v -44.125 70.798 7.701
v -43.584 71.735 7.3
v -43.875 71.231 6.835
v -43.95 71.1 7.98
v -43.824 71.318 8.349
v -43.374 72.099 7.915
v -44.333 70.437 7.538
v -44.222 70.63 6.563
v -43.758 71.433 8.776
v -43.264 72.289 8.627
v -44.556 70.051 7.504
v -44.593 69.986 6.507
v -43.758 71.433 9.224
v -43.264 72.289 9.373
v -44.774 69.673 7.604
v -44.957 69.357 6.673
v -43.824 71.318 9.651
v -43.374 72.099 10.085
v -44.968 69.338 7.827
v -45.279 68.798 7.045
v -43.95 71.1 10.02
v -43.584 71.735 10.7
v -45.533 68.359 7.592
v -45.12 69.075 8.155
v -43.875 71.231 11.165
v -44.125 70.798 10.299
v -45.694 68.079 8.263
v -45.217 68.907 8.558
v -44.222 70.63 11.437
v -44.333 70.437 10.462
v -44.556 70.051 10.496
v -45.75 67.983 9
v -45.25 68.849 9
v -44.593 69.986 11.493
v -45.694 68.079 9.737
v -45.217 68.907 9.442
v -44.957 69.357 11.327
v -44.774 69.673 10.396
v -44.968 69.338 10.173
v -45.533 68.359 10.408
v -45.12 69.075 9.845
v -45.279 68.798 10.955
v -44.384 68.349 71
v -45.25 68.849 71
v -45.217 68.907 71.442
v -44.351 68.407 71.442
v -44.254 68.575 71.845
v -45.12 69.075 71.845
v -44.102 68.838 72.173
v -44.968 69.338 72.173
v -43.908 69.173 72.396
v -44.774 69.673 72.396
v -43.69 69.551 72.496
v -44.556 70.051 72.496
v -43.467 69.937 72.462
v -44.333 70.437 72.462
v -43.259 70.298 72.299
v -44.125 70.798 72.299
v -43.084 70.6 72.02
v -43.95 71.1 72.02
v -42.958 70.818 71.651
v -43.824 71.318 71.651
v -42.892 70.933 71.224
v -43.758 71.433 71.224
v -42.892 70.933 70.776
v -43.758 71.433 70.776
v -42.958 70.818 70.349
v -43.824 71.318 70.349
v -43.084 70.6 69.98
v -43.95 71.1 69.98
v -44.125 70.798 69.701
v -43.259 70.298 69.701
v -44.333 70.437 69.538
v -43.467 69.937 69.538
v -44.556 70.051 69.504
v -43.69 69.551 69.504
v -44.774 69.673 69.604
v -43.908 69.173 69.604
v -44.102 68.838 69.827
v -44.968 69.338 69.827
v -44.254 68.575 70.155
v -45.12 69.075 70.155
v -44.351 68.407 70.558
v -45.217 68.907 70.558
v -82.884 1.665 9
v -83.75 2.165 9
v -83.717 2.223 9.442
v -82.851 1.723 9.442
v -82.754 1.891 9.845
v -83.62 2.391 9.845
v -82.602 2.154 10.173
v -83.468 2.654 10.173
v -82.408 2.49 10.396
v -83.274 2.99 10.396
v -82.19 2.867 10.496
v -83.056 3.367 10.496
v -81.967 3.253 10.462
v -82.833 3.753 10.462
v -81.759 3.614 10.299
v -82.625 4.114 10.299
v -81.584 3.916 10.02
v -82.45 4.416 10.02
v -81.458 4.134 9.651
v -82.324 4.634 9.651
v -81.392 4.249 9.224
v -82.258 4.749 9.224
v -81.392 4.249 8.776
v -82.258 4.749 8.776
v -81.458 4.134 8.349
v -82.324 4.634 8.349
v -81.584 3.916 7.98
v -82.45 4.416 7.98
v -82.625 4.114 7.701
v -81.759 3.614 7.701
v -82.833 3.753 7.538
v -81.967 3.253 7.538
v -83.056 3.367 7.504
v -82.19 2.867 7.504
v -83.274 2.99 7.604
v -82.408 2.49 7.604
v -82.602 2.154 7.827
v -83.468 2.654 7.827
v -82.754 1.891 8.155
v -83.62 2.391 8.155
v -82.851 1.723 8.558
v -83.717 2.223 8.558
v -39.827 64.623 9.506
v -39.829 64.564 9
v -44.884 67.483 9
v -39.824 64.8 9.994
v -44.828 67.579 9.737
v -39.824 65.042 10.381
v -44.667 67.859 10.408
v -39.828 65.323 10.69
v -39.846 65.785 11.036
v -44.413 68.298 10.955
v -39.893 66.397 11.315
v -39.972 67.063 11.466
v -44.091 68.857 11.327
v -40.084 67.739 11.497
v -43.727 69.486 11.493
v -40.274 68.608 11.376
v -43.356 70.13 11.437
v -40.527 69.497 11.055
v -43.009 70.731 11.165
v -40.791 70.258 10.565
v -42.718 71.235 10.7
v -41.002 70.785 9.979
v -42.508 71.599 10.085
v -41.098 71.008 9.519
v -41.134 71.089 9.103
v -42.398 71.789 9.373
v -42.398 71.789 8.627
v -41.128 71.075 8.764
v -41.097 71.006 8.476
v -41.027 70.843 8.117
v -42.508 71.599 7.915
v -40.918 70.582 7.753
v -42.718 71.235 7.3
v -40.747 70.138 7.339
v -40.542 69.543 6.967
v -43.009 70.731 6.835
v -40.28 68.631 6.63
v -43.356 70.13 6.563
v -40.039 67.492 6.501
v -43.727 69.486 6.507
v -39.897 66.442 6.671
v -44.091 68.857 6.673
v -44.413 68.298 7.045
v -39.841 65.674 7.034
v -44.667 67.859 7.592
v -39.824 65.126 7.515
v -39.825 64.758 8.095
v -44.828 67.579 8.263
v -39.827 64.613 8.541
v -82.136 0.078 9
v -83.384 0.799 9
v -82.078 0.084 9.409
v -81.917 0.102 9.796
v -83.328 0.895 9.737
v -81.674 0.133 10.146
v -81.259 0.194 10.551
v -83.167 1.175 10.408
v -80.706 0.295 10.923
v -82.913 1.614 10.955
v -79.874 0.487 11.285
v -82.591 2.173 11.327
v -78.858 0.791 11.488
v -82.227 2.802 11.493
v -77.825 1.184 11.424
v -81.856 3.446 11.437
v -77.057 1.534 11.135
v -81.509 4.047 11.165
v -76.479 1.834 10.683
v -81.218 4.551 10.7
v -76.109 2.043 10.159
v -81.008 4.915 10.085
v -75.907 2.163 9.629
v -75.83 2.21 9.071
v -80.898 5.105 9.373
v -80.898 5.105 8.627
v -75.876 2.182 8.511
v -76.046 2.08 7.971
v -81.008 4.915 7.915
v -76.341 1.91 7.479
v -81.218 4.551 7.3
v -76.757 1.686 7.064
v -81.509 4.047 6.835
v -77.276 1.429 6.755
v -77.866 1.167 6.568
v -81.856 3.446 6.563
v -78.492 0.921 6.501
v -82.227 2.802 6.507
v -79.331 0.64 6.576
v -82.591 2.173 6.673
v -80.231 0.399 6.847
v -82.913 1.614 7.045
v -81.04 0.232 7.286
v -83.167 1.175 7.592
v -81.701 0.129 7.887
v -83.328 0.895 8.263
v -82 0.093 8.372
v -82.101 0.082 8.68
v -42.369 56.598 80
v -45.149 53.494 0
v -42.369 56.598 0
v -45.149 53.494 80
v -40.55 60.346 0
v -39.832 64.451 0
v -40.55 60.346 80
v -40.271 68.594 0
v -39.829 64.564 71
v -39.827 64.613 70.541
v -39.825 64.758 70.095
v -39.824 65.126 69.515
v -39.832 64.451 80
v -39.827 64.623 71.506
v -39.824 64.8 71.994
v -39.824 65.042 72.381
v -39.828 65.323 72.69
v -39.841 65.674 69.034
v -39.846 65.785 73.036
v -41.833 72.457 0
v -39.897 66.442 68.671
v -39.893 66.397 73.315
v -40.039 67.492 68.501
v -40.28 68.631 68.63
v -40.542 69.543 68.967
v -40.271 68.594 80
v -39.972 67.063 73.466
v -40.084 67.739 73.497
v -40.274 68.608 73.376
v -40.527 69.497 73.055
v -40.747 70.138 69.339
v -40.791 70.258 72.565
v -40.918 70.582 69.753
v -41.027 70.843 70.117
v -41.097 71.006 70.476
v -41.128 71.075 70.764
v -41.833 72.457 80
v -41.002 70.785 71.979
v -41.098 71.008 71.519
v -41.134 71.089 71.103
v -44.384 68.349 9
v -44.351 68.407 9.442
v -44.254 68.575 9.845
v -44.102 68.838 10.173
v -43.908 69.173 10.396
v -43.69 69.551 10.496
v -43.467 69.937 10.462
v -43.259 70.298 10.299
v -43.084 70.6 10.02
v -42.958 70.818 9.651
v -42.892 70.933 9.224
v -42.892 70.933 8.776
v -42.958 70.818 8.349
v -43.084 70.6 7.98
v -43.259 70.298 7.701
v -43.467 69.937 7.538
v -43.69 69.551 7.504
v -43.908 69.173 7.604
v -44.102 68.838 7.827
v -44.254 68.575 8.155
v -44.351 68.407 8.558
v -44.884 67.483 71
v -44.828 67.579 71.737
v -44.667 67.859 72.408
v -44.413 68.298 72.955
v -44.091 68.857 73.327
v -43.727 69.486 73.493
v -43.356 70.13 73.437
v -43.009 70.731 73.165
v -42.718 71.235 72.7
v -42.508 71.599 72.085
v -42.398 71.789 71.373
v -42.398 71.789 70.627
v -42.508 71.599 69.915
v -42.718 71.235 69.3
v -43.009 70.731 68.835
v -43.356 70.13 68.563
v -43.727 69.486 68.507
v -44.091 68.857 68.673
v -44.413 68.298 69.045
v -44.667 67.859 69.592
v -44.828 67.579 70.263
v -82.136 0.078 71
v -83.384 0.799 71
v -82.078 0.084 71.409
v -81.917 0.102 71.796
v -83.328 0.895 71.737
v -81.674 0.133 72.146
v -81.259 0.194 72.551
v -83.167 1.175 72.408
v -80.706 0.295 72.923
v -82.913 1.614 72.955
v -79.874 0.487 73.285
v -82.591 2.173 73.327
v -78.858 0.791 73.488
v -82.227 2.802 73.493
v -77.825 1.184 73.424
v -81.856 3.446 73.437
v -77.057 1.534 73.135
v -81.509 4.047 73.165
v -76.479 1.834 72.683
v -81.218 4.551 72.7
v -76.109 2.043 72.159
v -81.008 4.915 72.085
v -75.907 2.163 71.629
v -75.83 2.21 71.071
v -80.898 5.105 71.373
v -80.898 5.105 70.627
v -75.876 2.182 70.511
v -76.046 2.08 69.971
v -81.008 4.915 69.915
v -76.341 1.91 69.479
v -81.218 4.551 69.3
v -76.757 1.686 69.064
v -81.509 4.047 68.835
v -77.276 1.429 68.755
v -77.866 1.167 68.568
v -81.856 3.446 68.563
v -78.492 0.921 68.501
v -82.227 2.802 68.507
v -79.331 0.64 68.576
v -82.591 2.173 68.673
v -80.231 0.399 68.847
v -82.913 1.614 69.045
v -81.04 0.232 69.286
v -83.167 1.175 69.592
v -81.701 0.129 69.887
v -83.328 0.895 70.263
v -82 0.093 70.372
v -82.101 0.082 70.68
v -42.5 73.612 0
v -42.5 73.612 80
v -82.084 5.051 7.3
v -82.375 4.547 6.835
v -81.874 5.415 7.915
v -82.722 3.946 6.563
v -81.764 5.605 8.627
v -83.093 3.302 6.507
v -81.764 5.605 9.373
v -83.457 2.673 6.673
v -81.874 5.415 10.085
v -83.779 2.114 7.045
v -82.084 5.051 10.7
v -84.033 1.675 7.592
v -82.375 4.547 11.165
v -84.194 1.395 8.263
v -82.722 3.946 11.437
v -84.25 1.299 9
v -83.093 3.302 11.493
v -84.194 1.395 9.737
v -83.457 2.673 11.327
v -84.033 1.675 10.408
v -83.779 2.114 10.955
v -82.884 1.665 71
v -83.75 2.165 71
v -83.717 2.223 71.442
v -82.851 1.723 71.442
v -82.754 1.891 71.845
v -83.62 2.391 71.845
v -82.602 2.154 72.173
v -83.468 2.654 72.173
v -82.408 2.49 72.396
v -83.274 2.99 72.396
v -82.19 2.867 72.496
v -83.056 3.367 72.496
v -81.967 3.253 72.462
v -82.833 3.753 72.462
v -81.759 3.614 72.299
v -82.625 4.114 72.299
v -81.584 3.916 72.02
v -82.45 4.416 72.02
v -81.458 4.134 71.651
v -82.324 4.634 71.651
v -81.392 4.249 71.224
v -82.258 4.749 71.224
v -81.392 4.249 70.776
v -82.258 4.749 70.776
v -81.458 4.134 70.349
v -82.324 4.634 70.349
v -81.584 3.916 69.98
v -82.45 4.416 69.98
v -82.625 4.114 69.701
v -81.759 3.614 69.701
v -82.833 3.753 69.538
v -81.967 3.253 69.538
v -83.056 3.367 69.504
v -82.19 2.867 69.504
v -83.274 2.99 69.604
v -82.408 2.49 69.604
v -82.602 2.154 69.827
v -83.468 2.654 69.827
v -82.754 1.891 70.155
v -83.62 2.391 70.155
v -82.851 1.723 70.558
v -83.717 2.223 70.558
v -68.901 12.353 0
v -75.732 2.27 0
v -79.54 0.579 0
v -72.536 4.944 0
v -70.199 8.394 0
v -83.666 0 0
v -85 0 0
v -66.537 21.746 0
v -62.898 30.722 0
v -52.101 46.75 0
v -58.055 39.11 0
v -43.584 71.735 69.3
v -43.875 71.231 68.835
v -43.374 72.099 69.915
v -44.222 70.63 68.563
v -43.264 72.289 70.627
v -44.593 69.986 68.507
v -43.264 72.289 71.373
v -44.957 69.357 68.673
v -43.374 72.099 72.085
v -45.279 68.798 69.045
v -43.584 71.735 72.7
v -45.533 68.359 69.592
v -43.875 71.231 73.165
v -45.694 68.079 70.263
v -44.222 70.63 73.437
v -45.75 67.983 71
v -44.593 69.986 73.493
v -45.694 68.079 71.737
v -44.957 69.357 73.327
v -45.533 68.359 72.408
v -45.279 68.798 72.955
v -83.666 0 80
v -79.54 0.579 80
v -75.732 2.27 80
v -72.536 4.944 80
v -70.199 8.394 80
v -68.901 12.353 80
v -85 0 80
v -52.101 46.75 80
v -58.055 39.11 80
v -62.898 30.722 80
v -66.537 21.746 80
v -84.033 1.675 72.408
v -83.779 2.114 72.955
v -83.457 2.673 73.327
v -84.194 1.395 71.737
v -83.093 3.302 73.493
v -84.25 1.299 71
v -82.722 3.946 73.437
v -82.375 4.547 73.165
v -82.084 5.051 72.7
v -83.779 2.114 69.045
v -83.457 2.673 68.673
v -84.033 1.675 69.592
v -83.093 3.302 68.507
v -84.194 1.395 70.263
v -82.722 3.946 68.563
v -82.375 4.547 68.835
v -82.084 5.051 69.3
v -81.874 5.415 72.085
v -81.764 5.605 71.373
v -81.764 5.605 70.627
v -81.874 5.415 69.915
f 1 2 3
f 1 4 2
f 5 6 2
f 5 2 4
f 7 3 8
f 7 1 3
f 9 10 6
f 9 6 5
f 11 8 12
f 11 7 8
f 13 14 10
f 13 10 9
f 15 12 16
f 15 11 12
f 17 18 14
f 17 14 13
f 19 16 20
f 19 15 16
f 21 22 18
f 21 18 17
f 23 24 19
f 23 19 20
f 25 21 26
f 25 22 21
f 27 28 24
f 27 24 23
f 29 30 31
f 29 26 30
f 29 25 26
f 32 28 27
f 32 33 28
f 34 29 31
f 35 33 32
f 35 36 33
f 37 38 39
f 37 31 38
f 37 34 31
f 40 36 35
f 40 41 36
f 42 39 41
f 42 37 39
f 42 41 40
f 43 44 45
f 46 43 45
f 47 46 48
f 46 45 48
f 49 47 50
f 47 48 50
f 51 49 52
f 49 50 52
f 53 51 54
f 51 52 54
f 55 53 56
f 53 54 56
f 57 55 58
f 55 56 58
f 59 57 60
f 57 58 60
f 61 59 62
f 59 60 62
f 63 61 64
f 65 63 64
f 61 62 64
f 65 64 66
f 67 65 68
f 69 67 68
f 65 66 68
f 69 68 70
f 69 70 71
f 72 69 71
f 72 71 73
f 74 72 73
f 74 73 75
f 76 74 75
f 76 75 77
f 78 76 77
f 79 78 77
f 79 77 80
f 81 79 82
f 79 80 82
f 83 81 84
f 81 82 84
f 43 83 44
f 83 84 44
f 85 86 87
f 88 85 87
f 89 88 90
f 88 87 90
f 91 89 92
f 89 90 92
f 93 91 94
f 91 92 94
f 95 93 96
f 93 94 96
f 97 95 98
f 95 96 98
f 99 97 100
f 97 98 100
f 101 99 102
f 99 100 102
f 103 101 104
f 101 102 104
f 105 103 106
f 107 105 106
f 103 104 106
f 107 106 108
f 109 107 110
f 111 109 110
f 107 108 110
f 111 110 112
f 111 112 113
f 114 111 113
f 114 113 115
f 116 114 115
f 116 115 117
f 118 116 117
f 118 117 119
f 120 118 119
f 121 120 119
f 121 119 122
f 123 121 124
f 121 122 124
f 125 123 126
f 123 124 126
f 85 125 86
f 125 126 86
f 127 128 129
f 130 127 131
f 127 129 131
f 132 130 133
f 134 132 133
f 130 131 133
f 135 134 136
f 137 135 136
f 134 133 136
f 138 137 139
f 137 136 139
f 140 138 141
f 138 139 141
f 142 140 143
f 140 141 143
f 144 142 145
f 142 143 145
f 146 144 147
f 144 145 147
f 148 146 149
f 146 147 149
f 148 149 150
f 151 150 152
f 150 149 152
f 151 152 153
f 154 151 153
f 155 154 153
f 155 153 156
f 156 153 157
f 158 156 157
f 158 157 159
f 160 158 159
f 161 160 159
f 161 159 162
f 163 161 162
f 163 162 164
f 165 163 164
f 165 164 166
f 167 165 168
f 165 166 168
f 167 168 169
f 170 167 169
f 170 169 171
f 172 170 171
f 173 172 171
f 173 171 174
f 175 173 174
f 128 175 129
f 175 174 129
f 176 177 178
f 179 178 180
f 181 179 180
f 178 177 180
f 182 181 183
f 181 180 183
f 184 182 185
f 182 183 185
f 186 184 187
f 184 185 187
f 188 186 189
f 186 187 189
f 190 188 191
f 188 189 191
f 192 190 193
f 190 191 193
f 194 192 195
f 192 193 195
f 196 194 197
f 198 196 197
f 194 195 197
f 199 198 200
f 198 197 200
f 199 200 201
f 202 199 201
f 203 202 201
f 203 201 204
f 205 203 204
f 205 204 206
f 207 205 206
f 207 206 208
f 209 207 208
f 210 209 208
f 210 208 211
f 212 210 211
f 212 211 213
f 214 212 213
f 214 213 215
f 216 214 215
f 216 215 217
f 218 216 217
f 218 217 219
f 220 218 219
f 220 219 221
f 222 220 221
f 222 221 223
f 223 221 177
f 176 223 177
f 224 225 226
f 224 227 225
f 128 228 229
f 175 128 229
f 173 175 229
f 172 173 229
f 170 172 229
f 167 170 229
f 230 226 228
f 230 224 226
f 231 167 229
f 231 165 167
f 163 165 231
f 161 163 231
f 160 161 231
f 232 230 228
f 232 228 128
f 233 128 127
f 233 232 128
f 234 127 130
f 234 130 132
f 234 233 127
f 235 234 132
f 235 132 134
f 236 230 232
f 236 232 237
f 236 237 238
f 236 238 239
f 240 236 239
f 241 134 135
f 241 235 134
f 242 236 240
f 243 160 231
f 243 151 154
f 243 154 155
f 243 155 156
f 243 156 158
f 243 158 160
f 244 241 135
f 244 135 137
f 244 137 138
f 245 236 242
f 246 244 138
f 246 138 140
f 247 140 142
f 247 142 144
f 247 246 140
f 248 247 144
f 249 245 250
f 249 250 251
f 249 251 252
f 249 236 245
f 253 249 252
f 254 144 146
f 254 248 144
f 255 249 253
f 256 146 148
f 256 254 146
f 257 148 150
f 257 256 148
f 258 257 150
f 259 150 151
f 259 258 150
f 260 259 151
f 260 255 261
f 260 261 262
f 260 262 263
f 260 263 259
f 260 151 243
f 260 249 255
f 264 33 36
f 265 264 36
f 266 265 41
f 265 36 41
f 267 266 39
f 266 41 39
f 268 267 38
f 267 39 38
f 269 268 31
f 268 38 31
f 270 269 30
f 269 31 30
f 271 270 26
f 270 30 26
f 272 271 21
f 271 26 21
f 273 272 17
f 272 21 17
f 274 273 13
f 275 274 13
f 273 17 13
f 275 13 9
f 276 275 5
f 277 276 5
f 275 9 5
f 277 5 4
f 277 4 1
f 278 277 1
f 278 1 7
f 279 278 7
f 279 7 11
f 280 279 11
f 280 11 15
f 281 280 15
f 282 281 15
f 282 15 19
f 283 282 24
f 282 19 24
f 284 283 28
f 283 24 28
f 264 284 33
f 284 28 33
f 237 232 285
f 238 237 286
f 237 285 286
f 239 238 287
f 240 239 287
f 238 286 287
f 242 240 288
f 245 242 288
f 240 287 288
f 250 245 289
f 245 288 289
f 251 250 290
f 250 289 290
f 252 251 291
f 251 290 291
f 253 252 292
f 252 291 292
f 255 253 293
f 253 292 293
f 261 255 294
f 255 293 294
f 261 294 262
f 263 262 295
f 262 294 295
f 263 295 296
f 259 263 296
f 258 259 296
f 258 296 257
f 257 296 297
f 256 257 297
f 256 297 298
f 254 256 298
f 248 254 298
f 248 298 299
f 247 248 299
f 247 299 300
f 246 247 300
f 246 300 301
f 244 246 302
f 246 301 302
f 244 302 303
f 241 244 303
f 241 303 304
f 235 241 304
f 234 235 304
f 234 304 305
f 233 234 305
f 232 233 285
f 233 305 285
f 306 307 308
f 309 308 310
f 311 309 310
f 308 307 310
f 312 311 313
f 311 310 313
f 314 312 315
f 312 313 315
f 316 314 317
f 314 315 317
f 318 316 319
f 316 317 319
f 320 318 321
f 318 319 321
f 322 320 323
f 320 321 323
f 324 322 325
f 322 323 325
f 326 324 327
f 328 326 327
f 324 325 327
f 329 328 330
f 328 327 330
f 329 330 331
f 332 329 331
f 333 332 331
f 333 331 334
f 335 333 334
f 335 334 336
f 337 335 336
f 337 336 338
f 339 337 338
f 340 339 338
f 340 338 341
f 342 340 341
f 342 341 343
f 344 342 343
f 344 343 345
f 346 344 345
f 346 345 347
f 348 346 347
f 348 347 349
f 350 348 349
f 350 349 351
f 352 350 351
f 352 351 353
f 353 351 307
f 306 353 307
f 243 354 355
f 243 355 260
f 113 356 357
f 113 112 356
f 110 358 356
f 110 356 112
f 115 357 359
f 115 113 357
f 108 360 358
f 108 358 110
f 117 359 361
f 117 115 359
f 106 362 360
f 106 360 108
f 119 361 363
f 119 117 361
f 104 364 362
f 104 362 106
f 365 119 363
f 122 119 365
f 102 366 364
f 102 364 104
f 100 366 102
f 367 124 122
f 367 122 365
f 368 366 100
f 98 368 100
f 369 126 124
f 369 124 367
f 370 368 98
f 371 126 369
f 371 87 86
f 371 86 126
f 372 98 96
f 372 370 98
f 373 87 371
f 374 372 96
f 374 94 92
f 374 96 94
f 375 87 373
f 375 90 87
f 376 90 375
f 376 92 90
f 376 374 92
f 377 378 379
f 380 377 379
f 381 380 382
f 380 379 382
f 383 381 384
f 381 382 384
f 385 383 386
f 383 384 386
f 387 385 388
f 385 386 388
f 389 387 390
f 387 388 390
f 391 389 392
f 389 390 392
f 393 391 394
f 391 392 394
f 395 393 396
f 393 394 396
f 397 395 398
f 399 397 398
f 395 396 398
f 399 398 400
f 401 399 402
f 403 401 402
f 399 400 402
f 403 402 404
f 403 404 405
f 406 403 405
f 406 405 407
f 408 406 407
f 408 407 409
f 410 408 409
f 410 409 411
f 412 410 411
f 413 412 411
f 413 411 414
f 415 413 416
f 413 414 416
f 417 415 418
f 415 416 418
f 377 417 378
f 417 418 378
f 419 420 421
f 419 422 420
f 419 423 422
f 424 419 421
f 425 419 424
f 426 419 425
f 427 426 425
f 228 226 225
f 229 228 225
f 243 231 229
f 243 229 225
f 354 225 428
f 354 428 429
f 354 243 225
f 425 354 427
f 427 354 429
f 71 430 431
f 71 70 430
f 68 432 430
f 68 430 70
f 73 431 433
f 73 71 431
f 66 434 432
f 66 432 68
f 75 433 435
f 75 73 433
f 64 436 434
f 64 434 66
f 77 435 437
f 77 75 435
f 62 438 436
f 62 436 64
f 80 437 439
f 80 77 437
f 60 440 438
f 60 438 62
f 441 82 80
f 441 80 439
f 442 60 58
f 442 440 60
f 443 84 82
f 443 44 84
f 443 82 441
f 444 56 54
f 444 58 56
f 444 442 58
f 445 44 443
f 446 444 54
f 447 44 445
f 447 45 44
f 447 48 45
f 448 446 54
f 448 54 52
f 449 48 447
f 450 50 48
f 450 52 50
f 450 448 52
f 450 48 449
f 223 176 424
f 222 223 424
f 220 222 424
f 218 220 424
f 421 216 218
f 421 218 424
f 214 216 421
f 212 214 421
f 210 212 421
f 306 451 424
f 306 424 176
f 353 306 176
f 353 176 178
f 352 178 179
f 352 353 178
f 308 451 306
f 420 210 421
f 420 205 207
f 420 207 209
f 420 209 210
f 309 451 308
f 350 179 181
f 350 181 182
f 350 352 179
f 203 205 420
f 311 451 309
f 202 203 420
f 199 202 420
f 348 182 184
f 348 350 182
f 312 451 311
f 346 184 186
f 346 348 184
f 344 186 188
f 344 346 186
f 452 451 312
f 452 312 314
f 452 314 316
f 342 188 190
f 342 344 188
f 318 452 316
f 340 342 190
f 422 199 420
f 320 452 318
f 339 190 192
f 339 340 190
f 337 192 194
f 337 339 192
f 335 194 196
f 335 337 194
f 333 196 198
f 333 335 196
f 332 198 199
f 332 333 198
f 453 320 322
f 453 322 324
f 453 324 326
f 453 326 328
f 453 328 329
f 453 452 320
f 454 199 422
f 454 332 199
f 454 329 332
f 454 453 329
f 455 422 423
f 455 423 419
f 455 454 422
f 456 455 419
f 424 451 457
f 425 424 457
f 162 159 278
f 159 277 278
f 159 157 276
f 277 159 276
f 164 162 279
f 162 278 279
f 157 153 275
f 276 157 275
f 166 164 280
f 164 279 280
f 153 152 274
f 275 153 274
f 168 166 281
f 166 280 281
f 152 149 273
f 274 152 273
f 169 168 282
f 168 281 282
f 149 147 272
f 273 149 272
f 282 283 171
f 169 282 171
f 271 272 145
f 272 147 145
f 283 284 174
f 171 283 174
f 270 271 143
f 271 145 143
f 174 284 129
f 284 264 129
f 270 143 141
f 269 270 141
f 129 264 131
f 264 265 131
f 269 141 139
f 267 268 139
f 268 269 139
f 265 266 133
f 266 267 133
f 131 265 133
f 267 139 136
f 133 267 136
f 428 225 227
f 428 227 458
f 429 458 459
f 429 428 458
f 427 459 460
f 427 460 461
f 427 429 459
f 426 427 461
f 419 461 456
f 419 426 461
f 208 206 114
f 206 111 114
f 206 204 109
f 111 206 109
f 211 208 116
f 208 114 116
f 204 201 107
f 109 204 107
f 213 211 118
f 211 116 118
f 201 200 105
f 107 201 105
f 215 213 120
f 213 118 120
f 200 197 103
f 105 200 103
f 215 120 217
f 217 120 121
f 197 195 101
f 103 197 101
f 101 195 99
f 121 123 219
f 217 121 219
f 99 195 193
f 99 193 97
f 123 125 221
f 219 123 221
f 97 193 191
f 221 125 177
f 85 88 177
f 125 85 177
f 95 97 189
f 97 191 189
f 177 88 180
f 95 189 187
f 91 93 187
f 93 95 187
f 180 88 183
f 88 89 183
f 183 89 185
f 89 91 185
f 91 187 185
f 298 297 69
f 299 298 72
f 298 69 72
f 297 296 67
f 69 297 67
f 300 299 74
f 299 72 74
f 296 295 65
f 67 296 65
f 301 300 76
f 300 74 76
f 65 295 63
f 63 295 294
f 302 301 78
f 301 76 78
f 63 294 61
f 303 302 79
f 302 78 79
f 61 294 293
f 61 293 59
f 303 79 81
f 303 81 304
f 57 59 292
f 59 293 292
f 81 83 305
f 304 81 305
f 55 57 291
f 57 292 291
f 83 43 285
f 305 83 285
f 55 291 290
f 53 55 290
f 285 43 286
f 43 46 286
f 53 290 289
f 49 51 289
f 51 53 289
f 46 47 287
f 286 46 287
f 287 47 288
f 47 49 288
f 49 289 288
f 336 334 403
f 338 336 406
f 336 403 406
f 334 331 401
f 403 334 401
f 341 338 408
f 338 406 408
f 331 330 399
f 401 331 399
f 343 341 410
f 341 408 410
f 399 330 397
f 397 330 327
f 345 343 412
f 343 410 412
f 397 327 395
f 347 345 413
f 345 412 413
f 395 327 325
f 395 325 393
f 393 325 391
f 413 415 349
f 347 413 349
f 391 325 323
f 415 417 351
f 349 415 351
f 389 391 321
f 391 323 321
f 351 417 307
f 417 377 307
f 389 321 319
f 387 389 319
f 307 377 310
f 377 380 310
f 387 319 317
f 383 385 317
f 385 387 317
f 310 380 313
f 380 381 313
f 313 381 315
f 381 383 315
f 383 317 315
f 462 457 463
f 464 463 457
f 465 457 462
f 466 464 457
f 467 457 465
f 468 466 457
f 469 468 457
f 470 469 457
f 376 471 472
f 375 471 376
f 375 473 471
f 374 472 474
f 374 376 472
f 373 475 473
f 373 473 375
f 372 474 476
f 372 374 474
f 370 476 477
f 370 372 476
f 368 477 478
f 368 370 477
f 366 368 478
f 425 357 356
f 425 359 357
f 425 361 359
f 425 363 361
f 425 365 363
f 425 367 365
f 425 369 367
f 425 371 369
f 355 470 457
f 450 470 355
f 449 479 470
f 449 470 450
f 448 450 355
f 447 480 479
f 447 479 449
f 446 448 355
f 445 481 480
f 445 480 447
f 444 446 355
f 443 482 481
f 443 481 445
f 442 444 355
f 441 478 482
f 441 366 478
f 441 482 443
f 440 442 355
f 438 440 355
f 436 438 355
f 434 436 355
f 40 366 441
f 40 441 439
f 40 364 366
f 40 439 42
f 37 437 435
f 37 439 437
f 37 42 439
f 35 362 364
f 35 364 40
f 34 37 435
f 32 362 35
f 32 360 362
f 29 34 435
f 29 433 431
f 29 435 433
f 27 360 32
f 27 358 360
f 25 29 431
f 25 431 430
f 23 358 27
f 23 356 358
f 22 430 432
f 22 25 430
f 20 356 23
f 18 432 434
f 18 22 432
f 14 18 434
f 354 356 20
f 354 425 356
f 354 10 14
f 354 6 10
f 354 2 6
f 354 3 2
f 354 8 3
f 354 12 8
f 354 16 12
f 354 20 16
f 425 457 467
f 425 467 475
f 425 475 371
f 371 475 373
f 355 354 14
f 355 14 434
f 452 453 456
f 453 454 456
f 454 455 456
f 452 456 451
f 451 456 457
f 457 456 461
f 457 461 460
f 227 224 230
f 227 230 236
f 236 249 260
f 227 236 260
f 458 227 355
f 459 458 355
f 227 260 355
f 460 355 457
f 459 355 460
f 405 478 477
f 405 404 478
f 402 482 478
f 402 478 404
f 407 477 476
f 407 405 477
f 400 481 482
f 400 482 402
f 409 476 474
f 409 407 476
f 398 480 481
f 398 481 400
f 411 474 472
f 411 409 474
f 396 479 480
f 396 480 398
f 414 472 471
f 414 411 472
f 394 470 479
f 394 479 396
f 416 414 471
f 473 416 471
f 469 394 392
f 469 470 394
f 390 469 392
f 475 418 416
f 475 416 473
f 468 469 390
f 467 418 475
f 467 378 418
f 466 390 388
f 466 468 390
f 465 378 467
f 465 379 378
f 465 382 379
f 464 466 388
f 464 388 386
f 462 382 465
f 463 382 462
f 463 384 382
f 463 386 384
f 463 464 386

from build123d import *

# Parameters (mm, degrees)
BOSS_EXTRUDE1_DEPTH       = 80
FILLET1_R                 = 15
FILLET2_R                 = 15
SKETCH3_R                 = 2.5
CUT_EXTRUDE1_DEPTH        = 10
SKETCH3_2_R               = 2.5
BOSS_EXTRUDE2_DEPTH       = 1
SKETCH5_R                 = 1.5
CUT_EXTRUDE2_DEPTH        = 1
LPATTERN1_COUNT           = 2
LPATTERN1_PITCH           = 62
LPATTERN2_COUNT           = 2
LPATTERN2_PITCH           = 77
LPATTERN2_COPY_1_SKETCH_R = 2.5
LPATTERN2_COPY_1_DEPTH    = 10
LPATTERN2_COPY_2_SKETCH_R = 2.5
LPATTERN2_COPY_2_DEPTH    = 1
LPATTERN2_COPY_3_SKETCH_R = 1.5
LPATTERN2_COPY_3_DEPTH    = 1


with BuildPart() as part:
    # Sketch2 → Boss-Extrude1 (new body)
    with BuildSketch(Plane.XY):
        with BuildLine():
            Line((-70, 0), (-85, 0))
            Line((-85, 0), (-42.5, 73.612159322))
            Line((-42.5, 73.612159322), (-35, 60.621778265))
            ThreePointArc((-35, 60.621778265), (-60.621778265, 35), (-70, 0))
        make_face()
    extrude(amount=BOSS_EXTRUDE1_DEPTH)

    # Fillet1
    fillet1_edges = [part.edges().sort_by_distance(p)[0] for p in [
        (-70, 0, 40),
    ]]
    fillet(fillet1_edges, radius=FILLET1_R)

    # Fillet2
    fillet2_edges = [part.edges().sort_by_distance(p)[0] for p in [
        (-35, 60.621778265, 40),
    ]]
    fillet(fillet2_edges, radius=FILLET2_R)

    # Sketch3 → Cut-Extrude1 (cut)
    with BuildSketch(Plane(origin=(-63.75, 36.806079661, 0), x_dir=(0, 0, 1), z_dir=(-0.866025403784438, 0.5000000000000011, 0))):
        with Locations((9, 38.5)):
            Circle(SKETCH3_R)
    cut_extrude1 = extrude(amount=-CUT_EXTRUDE1_DEPTH, mode=Mode.SUBTRACT)

    # Sketch3<2> → Boss-Extrude2 (add)
    with BuildSketch(Plane(origin=(-63.75, 36.806079661, 0), x_dir=(0, 0, 1), z_dir=(-0.866025403784438, 0.5000000000000011, 0))):
        with Locations((9, 38.5)):
            Circle(SKETCH3_2_R)
    boss_extrude2 = extrude(amount=-BOSS_EXTRUDE2_DEPTH)

    # Sketch5 → Cut-Extrude2 (cut)
    with BuildSketch(Plane(origin=(-63.75, 36.806079661, 0), x_dir=(0, 0, 1), z_dir=(-0.866025403784438, 0.5000000000000011, 0))):
        with Locations((9, 38.5)):
            Circle(SKETCH5_R)
    cut_extrude2 = extrude(amount=-CUT_EXTRUDE2_DEPTH, mode=Mode.SUBTRACT)

    # LPattern1: Cut-Extrude1, Boss-Extrude2, Cut-Extrude2 ×2
    with Locations(*[(0, 0, i * LPATTERN1_PITCH) for i in range(1, LPATTERN1_COUNT)]):
        add(cut_extrude1, mode=Mode.SUBTRACT)
        add(boss_extrude2)
        add(cut_extrude2, mode=Mode.SUBTRACT)

    # LPattern2: Cut-Extrude1, Boss-Extrude2, Cut-Extrude2 ×2
    with Locations(*[Vector(-0.500000000000001, -0.866025403784438, 0) * (i * LPATTERN2_PITCH) for i in range(1, LPATTERN2_COUNT)]):
        add(cut_extrude1, mode=Mode.SUBTRACT)
        add(boss_extrude2)
        add(cut_extrude2, mode=Mode.SUBTRACT)

    # LPattern2 copy 1 sketch → LPattern2 copy 1 (cut)
    with BuildSketch(Plane(origin=(-102.25, -29.877876431, 62), x_dir=(0, 0, 1), z_dir=(-0.866025403784438, 0.5000000000000011, 0))):
        with Locations((9, 38.5)):
            Circle(LPATTERN2_COPY_1_SKETCH_R)
    extrude(amount=-LPATTERN2_COPY_1_DEPTH, mode=Mode.SUBTRACT)

    # LPattern2 copy 2 sketch → LPattern2 copy 2 (add)
    with BuildSketch(Plane(origin=(-102.25, -29.877876431, 62), x_dir=(0, 0, 1), z_dir=(-0.866025403784438, 0.5000000000000011, 0))):
        with Locations((9, 38.5)):
            Circle(LPATTERN2_COPY_2_SKETCH_R)
    extrude(amount=-LPATTERN2_COPY_2_DEPTH)

    # LPattern2 copy 3 sketch → LPattern2 copy 3 (cut)
    with BuildSketch(Plane(origin=(-102.25, -29.877876431, 62), x_dir=(0, 0, 1), z_dir=(-0.866025403784438, 0.5000000000000011, 0))):
        with Locations((9, 38.5)):
            Circle(LPATTERN2_COPY_3_SKETCH_R)
    extrude(amount=-LPATTERN2_COPY_3_DEPTH, mode=Mode.SUBTRACT)


solid = part.part
